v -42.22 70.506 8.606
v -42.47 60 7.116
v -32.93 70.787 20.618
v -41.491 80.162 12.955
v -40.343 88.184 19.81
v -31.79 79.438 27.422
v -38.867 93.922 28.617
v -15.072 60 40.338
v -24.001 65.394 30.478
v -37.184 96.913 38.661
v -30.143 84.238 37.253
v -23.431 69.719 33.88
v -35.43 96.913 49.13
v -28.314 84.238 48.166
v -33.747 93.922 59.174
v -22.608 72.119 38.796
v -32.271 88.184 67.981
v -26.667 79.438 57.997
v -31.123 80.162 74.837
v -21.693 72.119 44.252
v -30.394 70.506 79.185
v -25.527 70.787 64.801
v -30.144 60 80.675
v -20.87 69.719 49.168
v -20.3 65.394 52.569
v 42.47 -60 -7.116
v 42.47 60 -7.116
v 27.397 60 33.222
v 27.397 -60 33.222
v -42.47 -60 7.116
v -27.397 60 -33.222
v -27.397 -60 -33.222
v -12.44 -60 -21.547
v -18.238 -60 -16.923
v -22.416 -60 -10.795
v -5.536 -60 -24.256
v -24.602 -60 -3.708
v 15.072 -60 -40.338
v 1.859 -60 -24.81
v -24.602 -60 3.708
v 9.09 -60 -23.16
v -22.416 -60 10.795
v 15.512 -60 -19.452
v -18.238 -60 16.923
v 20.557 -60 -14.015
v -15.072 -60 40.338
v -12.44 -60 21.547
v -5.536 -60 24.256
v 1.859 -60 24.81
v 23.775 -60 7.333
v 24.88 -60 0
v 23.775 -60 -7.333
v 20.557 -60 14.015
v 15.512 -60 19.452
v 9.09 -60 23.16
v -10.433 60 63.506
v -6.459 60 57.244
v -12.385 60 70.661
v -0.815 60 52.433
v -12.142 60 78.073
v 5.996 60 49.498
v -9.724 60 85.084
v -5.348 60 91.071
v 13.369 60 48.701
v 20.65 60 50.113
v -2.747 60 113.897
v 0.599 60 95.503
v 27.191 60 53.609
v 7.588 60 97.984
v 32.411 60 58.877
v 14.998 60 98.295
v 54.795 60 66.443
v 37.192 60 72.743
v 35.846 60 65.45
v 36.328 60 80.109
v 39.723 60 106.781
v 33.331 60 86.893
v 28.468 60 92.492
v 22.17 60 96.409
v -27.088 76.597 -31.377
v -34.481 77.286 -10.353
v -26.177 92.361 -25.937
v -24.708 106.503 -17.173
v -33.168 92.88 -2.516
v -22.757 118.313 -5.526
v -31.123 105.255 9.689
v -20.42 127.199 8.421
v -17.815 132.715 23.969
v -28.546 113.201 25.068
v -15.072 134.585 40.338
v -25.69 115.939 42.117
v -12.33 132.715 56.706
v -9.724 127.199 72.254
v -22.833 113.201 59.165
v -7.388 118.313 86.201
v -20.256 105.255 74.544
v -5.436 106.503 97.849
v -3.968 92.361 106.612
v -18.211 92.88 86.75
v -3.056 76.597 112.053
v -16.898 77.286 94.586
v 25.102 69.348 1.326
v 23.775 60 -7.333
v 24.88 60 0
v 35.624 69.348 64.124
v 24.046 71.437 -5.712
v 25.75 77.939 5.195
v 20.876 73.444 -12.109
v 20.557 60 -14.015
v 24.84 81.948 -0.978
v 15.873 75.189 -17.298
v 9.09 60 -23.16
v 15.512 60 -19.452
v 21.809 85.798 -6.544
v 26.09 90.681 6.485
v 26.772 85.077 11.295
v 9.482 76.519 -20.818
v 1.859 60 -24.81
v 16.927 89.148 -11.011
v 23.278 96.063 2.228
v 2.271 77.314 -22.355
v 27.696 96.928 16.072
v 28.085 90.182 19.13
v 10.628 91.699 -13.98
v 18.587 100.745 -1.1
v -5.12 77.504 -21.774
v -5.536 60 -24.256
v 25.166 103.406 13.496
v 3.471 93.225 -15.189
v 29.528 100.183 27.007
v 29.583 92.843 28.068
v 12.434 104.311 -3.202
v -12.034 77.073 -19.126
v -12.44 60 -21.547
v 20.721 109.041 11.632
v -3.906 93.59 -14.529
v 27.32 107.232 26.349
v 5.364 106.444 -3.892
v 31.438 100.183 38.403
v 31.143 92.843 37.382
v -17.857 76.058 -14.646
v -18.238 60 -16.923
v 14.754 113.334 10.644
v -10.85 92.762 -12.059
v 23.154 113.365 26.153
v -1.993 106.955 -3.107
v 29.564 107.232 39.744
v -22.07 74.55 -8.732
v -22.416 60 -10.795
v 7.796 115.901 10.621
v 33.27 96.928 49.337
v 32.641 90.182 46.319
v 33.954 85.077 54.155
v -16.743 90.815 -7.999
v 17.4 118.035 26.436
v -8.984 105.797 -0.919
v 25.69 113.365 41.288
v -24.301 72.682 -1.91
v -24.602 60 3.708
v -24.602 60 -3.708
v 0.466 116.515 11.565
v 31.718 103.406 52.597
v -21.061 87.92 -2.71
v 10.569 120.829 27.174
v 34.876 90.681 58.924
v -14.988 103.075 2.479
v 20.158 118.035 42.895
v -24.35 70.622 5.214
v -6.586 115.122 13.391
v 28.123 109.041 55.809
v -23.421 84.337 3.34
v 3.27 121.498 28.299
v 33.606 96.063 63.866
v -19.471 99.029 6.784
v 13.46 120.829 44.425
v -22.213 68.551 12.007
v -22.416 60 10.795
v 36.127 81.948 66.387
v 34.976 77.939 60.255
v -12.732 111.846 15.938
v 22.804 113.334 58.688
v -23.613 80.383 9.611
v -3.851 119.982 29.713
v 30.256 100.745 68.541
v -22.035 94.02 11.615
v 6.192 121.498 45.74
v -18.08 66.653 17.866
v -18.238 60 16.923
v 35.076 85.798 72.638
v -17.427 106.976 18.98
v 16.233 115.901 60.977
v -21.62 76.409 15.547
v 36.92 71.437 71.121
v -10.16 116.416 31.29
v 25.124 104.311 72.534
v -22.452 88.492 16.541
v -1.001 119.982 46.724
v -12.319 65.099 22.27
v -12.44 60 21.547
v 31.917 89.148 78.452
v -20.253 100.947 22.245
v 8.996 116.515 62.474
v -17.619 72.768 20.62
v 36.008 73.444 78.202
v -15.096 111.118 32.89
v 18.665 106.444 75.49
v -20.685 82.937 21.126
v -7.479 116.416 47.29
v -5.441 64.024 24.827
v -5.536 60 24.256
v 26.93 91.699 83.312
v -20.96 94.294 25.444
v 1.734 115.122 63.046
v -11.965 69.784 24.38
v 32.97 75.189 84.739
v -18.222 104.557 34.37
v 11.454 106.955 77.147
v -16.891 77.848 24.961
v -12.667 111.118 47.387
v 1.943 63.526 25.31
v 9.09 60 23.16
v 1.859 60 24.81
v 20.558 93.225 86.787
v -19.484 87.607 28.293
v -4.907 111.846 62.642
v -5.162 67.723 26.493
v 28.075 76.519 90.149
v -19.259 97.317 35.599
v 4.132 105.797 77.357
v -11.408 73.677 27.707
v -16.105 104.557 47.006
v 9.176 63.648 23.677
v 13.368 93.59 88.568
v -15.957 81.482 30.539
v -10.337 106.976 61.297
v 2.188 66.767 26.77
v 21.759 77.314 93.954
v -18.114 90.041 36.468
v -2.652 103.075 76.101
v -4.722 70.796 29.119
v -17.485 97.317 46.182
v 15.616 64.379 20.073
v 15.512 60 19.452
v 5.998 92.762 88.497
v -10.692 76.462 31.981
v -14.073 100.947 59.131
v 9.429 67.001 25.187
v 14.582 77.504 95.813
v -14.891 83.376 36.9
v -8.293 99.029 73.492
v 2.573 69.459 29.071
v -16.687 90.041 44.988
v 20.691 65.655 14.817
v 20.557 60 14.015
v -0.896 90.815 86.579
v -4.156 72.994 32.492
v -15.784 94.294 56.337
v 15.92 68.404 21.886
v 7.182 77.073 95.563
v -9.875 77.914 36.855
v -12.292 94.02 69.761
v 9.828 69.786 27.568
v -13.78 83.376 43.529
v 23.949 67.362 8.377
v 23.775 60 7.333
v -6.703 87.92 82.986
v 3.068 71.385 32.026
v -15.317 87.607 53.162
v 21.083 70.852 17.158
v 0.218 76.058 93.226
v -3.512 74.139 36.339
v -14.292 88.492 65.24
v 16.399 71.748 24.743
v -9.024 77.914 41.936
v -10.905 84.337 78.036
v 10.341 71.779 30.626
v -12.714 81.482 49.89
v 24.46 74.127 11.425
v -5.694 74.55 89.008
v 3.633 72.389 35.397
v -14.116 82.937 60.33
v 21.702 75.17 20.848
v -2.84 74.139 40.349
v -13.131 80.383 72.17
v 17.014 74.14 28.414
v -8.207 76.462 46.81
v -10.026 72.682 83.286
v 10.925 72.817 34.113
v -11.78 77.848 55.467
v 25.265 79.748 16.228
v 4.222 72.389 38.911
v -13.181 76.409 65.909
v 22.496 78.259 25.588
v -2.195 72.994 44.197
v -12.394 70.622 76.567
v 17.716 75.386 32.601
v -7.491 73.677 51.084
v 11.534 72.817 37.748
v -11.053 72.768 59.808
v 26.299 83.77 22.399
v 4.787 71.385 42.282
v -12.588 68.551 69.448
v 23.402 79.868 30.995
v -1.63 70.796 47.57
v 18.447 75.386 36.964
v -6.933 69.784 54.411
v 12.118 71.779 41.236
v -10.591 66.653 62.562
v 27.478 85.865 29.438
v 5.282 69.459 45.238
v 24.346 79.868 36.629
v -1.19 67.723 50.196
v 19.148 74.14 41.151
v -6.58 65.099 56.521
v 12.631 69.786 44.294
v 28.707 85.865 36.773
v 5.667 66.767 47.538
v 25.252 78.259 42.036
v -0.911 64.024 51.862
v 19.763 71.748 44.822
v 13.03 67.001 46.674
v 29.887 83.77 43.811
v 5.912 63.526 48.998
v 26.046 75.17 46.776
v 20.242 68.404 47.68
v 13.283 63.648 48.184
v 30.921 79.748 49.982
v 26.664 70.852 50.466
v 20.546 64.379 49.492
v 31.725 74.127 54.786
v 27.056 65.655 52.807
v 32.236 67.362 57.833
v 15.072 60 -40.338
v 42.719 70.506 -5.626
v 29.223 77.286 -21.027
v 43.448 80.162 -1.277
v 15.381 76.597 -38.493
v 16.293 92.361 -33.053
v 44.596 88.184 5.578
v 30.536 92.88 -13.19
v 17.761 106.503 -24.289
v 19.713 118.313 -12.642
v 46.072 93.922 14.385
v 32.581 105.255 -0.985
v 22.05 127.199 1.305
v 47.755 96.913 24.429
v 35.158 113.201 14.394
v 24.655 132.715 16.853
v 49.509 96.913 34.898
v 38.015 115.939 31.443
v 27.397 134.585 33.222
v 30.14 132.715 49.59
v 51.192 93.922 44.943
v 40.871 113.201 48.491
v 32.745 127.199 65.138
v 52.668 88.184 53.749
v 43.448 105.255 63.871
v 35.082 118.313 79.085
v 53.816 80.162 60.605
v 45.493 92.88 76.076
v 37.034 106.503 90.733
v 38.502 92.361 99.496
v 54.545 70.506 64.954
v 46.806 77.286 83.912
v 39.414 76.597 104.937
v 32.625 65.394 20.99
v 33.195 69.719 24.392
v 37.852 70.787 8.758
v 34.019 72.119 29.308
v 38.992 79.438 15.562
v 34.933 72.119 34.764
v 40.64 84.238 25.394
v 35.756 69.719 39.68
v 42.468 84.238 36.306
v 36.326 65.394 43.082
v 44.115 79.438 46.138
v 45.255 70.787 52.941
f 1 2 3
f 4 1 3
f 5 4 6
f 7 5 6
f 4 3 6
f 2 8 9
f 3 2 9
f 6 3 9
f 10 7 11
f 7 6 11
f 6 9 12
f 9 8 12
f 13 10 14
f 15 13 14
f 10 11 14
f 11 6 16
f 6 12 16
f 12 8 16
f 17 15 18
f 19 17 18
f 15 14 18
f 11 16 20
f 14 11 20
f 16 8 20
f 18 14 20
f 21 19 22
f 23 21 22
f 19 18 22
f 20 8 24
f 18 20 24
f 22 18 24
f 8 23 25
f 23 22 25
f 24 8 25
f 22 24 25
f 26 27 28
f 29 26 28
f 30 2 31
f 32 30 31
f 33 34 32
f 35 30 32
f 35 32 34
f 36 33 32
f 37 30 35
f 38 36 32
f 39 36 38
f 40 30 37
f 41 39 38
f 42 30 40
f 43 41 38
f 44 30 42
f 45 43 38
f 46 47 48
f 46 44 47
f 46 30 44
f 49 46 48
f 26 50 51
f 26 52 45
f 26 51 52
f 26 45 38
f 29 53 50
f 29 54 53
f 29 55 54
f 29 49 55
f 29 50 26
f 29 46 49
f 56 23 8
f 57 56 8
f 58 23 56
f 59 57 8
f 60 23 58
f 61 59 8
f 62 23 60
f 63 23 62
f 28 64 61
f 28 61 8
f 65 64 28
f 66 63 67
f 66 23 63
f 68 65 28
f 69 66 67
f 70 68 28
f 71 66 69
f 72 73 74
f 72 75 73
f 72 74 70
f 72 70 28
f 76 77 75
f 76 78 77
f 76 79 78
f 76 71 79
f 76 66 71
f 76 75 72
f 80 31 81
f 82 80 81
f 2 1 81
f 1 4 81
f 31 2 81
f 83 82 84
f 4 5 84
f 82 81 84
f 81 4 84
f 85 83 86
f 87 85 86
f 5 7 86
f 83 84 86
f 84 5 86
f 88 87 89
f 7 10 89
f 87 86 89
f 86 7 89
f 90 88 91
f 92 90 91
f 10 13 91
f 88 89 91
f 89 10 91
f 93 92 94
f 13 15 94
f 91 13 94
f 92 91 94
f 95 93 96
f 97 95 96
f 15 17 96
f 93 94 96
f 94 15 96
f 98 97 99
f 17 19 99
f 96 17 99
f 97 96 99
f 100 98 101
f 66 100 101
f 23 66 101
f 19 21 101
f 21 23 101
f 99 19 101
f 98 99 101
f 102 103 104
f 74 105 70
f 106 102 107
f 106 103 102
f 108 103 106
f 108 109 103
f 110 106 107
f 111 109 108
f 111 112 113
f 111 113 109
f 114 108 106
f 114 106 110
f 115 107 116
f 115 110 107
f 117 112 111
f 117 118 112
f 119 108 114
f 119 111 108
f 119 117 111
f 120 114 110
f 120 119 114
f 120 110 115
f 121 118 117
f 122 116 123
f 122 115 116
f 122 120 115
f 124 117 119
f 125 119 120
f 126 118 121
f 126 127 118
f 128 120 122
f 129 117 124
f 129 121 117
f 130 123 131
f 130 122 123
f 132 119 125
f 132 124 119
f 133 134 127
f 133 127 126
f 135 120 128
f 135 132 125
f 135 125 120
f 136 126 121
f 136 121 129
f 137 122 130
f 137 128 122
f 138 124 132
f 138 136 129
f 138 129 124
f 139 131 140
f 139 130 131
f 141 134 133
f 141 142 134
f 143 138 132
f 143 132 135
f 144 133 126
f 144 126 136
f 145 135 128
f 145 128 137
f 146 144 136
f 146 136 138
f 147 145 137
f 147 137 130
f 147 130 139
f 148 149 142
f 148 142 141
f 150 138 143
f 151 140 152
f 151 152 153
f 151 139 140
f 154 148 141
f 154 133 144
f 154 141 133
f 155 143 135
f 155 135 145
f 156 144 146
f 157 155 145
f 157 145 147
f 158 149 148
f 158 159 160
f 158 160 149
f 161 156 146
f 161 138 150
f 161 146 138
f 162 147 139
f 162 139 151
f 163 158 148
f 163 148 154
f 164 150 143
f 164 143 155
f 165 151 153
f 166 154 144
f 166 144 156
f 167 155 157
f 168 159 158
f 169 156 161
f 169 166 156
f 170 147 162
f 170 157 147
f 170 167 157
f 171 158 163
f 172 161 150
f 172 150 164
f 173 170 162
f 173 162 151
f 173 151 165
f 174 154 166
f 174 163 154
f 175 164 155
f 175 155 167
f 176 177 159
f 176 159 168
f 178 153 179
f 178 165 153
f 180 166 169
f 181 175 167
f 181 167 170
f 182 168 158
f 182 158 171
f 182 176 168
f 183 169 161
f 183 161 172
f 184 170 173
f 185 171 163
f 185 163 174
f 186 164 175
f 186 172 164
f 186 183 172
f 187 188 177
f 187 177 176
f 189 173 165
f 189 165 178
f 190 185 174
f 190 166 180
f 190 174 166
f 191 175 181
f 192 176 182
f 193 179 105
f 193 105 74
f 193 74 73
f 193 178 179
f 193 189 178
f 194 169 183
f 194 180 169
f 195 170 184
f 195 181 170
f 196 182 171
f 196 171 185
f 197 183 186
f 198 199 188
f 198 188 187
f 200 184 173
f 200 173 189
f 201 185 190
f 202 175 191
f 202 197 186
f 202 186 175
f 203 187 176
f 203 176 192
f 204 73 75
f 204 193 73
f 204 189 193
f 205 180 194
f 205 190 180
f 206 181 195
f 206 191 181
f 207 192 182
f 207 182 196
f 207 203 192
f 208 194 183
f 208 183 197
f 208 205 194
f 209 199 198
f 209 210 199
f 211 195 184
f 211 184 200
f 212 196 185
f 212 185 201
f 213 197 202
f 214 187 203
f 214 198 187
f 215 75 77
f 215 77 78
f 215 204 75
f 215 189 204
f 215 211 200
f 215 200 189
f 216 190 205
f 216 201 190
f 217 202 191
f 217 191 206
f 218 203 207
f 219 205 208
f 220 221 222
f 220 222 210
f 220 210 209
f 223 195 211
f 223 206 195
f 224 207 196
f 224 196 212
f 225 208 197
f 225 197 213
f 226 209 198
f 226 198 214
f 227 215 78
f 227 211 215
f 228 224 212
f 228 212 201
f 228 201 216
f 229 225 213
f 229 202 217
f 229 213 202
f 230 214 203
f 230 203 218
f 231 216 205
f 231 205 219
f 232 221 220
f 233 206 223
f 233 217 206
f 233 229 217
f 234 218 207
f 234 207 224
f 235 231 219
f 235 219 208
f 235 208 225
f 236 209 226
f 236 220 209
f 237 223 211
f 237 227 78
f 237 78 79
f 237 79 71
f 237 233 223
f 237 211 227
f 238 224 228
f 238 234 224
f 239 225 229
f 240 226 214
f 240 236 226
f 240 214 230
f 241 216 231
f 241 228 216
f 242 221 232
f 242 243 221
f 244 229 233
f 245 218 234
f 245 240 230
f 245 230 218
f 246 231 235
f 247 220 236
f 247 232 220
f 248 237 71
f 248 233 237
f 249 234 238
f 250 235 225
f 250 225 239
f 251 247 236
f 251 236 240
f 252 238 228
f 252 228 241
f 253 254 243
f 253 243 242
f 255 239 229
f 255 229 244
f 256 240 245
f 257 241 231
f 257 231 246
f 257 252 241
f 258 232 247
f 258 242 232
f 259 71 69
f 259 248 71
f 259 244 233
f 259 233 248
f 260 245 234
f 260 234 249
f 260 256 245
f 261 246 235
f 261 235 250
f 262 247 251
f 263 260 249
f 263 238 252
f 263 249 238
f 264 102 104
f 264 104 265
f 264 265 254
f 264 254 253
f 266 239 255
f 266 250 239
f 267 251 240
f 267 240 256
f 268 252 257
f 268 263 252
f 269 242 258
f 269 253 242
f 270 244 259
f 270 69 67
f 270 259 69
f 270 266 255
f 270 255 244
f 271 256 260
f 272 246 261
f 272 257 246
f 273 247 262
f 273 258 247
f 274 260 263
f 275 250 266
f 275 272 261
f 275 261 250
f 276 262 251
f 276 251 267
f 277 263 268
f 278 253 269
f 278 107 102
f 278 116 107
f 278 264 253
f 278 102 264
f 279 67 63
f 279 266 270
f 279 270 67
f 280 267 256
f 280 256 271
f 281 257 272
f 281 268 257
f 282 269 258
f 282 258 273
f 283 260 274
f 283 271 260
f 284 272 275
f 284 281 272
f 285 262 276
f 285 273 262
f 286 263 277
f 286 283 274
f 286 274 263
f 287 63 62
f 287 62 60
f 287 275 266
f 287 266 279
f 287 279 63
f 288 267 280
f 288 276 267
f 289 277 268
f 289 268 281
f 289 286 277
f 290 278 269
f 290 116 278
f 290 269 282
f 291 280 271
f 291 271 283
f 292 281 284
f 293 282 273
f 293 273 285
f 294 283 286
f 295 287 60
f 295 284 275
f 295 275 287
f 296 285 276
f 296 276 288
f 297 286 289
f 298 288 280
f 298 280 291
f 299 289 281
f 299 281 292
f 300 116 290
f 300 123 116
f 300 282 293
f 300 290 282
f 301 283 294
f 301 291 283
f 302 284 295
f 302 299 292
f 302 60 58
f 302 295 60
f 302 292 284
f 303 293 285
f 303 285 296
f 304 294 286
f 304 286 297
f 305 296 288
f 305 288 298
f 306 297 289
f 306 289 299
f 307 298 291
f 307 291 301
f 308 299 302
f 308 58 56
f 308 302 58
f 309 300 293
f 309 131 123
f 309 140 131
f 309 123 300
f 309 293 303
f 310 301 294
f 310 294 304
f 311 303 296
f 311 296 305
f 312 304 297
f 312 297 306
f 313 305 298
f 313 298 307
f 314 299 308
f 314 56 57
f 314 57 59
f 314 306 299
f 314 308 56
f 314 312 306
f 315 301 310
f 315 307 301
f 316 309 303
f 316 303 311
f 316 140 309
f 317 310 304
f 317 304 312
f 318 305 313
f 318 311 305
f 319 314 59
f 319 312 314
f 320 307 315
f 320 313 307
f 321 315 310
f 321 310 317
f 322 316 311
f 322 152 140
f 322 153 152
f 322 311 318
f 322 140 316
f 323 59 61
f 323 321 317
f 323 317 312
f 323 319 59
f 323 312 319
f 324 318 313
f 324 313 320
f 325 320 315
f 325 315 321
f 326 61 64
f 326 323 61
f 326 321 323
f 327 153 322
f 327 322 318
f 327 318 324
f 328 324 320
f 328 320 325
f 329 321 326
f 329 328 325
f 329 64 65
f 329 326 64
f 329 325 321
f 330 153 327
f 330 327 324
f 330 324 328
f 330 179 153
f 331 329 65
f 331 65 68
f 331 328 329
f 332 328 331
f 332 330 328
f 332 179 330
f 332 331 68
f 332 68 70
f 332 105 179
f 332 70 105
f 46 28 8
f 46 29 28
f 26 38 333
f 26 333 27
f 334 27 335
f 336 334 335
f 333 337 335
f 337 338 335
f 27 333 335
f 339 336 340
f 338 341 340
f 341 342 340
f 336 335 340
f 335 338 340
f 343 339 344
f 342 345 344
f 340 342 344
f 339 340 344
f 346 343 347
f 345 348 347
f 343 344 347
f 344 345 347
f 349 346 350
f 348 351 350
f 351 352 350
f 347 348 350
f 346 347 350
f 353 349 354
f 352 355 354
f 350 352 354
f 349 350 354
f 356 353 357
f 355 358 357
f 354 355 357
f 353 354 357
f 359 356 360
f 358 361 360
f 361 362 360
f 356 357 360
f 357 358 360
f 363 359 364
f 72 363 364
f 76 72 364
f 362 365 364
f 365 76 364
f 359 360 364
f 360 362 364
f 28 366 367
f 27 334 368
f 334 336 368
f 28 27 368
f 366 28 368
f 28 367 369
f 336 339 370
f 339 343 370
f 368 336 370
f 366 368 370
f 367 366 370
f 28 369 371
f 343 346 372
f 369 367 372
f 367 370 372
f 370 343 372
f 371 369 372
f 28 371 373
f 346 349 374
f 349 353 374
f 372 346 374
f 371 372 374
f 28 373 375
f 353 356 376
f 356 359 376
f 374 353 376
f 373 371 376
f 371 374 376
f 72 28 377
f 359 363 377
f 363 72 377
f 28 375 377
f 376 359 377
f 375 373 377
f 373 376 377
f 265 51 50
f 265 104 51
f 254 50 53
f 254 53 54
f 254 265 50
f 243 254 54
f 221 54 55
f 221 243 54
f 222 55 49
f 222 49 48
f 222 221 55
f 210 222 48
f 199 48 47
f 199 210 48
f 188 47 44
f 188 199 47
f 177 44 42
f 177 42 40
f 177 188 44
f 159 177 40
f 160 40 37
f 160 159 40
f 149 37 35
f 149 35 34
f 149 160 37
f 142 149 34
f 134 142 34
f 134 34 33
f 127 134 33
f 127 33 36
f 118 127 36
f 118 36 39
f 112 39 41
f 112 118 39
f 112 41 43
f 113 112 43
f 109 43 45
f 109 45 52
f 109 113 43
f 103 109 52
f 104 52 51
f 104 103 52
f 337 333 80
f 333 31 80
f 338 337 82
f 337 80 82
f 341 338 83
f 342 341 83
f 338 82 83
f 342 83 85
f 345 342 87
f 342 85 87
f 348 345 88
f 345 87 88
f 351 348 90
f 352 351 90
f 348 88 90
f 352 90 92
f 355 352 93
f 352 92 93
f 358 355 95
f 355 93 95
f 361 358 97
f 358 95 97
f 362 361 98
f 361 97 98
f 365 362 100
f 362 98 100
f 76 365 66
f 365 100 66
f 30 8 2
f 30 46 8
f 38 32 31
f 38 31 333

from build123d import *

# Parameters (mm, degrees)
F0_R      = 24.8798987062
F1_DEPTH  = 60
F1_FACE_R = 24.8798987062
F2_ANGLE  = 180


with BuildPart() as f1:
    # F0 (on Front) → F1 (new body, symmetric)
    with BuildSketch(Plane.XZ):
        Polygon((-42.4695287796, 7.1159532226), (-27.3973606527, -33.2217141986), (15.0721681269, -40.3376674212), (42.4695287796, -7.1159532226), (27.3973606527, 33.2217141986), (-15.0721681269, 40.3376674212), align=None)
        Circle(F0_R, mode=Mode.SUBTRACT)
    extrude(amount=F1_DEPTH, both=True)

    # F1_face (on face) → F2 (revolve)
    with BuildSketch(Plane(origin=(0, 60, 0), x_dir=(1, 0, 0), z_dir=(0, 1, 0))):
        Polygon((-42.4695287796, -7.1159532226), (-15.0721681269, -40.3376674212), (27.3973606527, -33.2217141986), (42.4695287796, 7.1159532226), (15.0721681269, 40.3376674212), (-27.3973606527, 33.2217141986), align=None)
        Circle(F1_FACE_R, mode=Mode.SUBTRACT)
    revolve(axis=Axis((6.1625962629, 60, 36.7796908099), (0.9862515905, 0, -0.1652507194)), revolution_arc=F2_ANGLE)


solid = f1.part
